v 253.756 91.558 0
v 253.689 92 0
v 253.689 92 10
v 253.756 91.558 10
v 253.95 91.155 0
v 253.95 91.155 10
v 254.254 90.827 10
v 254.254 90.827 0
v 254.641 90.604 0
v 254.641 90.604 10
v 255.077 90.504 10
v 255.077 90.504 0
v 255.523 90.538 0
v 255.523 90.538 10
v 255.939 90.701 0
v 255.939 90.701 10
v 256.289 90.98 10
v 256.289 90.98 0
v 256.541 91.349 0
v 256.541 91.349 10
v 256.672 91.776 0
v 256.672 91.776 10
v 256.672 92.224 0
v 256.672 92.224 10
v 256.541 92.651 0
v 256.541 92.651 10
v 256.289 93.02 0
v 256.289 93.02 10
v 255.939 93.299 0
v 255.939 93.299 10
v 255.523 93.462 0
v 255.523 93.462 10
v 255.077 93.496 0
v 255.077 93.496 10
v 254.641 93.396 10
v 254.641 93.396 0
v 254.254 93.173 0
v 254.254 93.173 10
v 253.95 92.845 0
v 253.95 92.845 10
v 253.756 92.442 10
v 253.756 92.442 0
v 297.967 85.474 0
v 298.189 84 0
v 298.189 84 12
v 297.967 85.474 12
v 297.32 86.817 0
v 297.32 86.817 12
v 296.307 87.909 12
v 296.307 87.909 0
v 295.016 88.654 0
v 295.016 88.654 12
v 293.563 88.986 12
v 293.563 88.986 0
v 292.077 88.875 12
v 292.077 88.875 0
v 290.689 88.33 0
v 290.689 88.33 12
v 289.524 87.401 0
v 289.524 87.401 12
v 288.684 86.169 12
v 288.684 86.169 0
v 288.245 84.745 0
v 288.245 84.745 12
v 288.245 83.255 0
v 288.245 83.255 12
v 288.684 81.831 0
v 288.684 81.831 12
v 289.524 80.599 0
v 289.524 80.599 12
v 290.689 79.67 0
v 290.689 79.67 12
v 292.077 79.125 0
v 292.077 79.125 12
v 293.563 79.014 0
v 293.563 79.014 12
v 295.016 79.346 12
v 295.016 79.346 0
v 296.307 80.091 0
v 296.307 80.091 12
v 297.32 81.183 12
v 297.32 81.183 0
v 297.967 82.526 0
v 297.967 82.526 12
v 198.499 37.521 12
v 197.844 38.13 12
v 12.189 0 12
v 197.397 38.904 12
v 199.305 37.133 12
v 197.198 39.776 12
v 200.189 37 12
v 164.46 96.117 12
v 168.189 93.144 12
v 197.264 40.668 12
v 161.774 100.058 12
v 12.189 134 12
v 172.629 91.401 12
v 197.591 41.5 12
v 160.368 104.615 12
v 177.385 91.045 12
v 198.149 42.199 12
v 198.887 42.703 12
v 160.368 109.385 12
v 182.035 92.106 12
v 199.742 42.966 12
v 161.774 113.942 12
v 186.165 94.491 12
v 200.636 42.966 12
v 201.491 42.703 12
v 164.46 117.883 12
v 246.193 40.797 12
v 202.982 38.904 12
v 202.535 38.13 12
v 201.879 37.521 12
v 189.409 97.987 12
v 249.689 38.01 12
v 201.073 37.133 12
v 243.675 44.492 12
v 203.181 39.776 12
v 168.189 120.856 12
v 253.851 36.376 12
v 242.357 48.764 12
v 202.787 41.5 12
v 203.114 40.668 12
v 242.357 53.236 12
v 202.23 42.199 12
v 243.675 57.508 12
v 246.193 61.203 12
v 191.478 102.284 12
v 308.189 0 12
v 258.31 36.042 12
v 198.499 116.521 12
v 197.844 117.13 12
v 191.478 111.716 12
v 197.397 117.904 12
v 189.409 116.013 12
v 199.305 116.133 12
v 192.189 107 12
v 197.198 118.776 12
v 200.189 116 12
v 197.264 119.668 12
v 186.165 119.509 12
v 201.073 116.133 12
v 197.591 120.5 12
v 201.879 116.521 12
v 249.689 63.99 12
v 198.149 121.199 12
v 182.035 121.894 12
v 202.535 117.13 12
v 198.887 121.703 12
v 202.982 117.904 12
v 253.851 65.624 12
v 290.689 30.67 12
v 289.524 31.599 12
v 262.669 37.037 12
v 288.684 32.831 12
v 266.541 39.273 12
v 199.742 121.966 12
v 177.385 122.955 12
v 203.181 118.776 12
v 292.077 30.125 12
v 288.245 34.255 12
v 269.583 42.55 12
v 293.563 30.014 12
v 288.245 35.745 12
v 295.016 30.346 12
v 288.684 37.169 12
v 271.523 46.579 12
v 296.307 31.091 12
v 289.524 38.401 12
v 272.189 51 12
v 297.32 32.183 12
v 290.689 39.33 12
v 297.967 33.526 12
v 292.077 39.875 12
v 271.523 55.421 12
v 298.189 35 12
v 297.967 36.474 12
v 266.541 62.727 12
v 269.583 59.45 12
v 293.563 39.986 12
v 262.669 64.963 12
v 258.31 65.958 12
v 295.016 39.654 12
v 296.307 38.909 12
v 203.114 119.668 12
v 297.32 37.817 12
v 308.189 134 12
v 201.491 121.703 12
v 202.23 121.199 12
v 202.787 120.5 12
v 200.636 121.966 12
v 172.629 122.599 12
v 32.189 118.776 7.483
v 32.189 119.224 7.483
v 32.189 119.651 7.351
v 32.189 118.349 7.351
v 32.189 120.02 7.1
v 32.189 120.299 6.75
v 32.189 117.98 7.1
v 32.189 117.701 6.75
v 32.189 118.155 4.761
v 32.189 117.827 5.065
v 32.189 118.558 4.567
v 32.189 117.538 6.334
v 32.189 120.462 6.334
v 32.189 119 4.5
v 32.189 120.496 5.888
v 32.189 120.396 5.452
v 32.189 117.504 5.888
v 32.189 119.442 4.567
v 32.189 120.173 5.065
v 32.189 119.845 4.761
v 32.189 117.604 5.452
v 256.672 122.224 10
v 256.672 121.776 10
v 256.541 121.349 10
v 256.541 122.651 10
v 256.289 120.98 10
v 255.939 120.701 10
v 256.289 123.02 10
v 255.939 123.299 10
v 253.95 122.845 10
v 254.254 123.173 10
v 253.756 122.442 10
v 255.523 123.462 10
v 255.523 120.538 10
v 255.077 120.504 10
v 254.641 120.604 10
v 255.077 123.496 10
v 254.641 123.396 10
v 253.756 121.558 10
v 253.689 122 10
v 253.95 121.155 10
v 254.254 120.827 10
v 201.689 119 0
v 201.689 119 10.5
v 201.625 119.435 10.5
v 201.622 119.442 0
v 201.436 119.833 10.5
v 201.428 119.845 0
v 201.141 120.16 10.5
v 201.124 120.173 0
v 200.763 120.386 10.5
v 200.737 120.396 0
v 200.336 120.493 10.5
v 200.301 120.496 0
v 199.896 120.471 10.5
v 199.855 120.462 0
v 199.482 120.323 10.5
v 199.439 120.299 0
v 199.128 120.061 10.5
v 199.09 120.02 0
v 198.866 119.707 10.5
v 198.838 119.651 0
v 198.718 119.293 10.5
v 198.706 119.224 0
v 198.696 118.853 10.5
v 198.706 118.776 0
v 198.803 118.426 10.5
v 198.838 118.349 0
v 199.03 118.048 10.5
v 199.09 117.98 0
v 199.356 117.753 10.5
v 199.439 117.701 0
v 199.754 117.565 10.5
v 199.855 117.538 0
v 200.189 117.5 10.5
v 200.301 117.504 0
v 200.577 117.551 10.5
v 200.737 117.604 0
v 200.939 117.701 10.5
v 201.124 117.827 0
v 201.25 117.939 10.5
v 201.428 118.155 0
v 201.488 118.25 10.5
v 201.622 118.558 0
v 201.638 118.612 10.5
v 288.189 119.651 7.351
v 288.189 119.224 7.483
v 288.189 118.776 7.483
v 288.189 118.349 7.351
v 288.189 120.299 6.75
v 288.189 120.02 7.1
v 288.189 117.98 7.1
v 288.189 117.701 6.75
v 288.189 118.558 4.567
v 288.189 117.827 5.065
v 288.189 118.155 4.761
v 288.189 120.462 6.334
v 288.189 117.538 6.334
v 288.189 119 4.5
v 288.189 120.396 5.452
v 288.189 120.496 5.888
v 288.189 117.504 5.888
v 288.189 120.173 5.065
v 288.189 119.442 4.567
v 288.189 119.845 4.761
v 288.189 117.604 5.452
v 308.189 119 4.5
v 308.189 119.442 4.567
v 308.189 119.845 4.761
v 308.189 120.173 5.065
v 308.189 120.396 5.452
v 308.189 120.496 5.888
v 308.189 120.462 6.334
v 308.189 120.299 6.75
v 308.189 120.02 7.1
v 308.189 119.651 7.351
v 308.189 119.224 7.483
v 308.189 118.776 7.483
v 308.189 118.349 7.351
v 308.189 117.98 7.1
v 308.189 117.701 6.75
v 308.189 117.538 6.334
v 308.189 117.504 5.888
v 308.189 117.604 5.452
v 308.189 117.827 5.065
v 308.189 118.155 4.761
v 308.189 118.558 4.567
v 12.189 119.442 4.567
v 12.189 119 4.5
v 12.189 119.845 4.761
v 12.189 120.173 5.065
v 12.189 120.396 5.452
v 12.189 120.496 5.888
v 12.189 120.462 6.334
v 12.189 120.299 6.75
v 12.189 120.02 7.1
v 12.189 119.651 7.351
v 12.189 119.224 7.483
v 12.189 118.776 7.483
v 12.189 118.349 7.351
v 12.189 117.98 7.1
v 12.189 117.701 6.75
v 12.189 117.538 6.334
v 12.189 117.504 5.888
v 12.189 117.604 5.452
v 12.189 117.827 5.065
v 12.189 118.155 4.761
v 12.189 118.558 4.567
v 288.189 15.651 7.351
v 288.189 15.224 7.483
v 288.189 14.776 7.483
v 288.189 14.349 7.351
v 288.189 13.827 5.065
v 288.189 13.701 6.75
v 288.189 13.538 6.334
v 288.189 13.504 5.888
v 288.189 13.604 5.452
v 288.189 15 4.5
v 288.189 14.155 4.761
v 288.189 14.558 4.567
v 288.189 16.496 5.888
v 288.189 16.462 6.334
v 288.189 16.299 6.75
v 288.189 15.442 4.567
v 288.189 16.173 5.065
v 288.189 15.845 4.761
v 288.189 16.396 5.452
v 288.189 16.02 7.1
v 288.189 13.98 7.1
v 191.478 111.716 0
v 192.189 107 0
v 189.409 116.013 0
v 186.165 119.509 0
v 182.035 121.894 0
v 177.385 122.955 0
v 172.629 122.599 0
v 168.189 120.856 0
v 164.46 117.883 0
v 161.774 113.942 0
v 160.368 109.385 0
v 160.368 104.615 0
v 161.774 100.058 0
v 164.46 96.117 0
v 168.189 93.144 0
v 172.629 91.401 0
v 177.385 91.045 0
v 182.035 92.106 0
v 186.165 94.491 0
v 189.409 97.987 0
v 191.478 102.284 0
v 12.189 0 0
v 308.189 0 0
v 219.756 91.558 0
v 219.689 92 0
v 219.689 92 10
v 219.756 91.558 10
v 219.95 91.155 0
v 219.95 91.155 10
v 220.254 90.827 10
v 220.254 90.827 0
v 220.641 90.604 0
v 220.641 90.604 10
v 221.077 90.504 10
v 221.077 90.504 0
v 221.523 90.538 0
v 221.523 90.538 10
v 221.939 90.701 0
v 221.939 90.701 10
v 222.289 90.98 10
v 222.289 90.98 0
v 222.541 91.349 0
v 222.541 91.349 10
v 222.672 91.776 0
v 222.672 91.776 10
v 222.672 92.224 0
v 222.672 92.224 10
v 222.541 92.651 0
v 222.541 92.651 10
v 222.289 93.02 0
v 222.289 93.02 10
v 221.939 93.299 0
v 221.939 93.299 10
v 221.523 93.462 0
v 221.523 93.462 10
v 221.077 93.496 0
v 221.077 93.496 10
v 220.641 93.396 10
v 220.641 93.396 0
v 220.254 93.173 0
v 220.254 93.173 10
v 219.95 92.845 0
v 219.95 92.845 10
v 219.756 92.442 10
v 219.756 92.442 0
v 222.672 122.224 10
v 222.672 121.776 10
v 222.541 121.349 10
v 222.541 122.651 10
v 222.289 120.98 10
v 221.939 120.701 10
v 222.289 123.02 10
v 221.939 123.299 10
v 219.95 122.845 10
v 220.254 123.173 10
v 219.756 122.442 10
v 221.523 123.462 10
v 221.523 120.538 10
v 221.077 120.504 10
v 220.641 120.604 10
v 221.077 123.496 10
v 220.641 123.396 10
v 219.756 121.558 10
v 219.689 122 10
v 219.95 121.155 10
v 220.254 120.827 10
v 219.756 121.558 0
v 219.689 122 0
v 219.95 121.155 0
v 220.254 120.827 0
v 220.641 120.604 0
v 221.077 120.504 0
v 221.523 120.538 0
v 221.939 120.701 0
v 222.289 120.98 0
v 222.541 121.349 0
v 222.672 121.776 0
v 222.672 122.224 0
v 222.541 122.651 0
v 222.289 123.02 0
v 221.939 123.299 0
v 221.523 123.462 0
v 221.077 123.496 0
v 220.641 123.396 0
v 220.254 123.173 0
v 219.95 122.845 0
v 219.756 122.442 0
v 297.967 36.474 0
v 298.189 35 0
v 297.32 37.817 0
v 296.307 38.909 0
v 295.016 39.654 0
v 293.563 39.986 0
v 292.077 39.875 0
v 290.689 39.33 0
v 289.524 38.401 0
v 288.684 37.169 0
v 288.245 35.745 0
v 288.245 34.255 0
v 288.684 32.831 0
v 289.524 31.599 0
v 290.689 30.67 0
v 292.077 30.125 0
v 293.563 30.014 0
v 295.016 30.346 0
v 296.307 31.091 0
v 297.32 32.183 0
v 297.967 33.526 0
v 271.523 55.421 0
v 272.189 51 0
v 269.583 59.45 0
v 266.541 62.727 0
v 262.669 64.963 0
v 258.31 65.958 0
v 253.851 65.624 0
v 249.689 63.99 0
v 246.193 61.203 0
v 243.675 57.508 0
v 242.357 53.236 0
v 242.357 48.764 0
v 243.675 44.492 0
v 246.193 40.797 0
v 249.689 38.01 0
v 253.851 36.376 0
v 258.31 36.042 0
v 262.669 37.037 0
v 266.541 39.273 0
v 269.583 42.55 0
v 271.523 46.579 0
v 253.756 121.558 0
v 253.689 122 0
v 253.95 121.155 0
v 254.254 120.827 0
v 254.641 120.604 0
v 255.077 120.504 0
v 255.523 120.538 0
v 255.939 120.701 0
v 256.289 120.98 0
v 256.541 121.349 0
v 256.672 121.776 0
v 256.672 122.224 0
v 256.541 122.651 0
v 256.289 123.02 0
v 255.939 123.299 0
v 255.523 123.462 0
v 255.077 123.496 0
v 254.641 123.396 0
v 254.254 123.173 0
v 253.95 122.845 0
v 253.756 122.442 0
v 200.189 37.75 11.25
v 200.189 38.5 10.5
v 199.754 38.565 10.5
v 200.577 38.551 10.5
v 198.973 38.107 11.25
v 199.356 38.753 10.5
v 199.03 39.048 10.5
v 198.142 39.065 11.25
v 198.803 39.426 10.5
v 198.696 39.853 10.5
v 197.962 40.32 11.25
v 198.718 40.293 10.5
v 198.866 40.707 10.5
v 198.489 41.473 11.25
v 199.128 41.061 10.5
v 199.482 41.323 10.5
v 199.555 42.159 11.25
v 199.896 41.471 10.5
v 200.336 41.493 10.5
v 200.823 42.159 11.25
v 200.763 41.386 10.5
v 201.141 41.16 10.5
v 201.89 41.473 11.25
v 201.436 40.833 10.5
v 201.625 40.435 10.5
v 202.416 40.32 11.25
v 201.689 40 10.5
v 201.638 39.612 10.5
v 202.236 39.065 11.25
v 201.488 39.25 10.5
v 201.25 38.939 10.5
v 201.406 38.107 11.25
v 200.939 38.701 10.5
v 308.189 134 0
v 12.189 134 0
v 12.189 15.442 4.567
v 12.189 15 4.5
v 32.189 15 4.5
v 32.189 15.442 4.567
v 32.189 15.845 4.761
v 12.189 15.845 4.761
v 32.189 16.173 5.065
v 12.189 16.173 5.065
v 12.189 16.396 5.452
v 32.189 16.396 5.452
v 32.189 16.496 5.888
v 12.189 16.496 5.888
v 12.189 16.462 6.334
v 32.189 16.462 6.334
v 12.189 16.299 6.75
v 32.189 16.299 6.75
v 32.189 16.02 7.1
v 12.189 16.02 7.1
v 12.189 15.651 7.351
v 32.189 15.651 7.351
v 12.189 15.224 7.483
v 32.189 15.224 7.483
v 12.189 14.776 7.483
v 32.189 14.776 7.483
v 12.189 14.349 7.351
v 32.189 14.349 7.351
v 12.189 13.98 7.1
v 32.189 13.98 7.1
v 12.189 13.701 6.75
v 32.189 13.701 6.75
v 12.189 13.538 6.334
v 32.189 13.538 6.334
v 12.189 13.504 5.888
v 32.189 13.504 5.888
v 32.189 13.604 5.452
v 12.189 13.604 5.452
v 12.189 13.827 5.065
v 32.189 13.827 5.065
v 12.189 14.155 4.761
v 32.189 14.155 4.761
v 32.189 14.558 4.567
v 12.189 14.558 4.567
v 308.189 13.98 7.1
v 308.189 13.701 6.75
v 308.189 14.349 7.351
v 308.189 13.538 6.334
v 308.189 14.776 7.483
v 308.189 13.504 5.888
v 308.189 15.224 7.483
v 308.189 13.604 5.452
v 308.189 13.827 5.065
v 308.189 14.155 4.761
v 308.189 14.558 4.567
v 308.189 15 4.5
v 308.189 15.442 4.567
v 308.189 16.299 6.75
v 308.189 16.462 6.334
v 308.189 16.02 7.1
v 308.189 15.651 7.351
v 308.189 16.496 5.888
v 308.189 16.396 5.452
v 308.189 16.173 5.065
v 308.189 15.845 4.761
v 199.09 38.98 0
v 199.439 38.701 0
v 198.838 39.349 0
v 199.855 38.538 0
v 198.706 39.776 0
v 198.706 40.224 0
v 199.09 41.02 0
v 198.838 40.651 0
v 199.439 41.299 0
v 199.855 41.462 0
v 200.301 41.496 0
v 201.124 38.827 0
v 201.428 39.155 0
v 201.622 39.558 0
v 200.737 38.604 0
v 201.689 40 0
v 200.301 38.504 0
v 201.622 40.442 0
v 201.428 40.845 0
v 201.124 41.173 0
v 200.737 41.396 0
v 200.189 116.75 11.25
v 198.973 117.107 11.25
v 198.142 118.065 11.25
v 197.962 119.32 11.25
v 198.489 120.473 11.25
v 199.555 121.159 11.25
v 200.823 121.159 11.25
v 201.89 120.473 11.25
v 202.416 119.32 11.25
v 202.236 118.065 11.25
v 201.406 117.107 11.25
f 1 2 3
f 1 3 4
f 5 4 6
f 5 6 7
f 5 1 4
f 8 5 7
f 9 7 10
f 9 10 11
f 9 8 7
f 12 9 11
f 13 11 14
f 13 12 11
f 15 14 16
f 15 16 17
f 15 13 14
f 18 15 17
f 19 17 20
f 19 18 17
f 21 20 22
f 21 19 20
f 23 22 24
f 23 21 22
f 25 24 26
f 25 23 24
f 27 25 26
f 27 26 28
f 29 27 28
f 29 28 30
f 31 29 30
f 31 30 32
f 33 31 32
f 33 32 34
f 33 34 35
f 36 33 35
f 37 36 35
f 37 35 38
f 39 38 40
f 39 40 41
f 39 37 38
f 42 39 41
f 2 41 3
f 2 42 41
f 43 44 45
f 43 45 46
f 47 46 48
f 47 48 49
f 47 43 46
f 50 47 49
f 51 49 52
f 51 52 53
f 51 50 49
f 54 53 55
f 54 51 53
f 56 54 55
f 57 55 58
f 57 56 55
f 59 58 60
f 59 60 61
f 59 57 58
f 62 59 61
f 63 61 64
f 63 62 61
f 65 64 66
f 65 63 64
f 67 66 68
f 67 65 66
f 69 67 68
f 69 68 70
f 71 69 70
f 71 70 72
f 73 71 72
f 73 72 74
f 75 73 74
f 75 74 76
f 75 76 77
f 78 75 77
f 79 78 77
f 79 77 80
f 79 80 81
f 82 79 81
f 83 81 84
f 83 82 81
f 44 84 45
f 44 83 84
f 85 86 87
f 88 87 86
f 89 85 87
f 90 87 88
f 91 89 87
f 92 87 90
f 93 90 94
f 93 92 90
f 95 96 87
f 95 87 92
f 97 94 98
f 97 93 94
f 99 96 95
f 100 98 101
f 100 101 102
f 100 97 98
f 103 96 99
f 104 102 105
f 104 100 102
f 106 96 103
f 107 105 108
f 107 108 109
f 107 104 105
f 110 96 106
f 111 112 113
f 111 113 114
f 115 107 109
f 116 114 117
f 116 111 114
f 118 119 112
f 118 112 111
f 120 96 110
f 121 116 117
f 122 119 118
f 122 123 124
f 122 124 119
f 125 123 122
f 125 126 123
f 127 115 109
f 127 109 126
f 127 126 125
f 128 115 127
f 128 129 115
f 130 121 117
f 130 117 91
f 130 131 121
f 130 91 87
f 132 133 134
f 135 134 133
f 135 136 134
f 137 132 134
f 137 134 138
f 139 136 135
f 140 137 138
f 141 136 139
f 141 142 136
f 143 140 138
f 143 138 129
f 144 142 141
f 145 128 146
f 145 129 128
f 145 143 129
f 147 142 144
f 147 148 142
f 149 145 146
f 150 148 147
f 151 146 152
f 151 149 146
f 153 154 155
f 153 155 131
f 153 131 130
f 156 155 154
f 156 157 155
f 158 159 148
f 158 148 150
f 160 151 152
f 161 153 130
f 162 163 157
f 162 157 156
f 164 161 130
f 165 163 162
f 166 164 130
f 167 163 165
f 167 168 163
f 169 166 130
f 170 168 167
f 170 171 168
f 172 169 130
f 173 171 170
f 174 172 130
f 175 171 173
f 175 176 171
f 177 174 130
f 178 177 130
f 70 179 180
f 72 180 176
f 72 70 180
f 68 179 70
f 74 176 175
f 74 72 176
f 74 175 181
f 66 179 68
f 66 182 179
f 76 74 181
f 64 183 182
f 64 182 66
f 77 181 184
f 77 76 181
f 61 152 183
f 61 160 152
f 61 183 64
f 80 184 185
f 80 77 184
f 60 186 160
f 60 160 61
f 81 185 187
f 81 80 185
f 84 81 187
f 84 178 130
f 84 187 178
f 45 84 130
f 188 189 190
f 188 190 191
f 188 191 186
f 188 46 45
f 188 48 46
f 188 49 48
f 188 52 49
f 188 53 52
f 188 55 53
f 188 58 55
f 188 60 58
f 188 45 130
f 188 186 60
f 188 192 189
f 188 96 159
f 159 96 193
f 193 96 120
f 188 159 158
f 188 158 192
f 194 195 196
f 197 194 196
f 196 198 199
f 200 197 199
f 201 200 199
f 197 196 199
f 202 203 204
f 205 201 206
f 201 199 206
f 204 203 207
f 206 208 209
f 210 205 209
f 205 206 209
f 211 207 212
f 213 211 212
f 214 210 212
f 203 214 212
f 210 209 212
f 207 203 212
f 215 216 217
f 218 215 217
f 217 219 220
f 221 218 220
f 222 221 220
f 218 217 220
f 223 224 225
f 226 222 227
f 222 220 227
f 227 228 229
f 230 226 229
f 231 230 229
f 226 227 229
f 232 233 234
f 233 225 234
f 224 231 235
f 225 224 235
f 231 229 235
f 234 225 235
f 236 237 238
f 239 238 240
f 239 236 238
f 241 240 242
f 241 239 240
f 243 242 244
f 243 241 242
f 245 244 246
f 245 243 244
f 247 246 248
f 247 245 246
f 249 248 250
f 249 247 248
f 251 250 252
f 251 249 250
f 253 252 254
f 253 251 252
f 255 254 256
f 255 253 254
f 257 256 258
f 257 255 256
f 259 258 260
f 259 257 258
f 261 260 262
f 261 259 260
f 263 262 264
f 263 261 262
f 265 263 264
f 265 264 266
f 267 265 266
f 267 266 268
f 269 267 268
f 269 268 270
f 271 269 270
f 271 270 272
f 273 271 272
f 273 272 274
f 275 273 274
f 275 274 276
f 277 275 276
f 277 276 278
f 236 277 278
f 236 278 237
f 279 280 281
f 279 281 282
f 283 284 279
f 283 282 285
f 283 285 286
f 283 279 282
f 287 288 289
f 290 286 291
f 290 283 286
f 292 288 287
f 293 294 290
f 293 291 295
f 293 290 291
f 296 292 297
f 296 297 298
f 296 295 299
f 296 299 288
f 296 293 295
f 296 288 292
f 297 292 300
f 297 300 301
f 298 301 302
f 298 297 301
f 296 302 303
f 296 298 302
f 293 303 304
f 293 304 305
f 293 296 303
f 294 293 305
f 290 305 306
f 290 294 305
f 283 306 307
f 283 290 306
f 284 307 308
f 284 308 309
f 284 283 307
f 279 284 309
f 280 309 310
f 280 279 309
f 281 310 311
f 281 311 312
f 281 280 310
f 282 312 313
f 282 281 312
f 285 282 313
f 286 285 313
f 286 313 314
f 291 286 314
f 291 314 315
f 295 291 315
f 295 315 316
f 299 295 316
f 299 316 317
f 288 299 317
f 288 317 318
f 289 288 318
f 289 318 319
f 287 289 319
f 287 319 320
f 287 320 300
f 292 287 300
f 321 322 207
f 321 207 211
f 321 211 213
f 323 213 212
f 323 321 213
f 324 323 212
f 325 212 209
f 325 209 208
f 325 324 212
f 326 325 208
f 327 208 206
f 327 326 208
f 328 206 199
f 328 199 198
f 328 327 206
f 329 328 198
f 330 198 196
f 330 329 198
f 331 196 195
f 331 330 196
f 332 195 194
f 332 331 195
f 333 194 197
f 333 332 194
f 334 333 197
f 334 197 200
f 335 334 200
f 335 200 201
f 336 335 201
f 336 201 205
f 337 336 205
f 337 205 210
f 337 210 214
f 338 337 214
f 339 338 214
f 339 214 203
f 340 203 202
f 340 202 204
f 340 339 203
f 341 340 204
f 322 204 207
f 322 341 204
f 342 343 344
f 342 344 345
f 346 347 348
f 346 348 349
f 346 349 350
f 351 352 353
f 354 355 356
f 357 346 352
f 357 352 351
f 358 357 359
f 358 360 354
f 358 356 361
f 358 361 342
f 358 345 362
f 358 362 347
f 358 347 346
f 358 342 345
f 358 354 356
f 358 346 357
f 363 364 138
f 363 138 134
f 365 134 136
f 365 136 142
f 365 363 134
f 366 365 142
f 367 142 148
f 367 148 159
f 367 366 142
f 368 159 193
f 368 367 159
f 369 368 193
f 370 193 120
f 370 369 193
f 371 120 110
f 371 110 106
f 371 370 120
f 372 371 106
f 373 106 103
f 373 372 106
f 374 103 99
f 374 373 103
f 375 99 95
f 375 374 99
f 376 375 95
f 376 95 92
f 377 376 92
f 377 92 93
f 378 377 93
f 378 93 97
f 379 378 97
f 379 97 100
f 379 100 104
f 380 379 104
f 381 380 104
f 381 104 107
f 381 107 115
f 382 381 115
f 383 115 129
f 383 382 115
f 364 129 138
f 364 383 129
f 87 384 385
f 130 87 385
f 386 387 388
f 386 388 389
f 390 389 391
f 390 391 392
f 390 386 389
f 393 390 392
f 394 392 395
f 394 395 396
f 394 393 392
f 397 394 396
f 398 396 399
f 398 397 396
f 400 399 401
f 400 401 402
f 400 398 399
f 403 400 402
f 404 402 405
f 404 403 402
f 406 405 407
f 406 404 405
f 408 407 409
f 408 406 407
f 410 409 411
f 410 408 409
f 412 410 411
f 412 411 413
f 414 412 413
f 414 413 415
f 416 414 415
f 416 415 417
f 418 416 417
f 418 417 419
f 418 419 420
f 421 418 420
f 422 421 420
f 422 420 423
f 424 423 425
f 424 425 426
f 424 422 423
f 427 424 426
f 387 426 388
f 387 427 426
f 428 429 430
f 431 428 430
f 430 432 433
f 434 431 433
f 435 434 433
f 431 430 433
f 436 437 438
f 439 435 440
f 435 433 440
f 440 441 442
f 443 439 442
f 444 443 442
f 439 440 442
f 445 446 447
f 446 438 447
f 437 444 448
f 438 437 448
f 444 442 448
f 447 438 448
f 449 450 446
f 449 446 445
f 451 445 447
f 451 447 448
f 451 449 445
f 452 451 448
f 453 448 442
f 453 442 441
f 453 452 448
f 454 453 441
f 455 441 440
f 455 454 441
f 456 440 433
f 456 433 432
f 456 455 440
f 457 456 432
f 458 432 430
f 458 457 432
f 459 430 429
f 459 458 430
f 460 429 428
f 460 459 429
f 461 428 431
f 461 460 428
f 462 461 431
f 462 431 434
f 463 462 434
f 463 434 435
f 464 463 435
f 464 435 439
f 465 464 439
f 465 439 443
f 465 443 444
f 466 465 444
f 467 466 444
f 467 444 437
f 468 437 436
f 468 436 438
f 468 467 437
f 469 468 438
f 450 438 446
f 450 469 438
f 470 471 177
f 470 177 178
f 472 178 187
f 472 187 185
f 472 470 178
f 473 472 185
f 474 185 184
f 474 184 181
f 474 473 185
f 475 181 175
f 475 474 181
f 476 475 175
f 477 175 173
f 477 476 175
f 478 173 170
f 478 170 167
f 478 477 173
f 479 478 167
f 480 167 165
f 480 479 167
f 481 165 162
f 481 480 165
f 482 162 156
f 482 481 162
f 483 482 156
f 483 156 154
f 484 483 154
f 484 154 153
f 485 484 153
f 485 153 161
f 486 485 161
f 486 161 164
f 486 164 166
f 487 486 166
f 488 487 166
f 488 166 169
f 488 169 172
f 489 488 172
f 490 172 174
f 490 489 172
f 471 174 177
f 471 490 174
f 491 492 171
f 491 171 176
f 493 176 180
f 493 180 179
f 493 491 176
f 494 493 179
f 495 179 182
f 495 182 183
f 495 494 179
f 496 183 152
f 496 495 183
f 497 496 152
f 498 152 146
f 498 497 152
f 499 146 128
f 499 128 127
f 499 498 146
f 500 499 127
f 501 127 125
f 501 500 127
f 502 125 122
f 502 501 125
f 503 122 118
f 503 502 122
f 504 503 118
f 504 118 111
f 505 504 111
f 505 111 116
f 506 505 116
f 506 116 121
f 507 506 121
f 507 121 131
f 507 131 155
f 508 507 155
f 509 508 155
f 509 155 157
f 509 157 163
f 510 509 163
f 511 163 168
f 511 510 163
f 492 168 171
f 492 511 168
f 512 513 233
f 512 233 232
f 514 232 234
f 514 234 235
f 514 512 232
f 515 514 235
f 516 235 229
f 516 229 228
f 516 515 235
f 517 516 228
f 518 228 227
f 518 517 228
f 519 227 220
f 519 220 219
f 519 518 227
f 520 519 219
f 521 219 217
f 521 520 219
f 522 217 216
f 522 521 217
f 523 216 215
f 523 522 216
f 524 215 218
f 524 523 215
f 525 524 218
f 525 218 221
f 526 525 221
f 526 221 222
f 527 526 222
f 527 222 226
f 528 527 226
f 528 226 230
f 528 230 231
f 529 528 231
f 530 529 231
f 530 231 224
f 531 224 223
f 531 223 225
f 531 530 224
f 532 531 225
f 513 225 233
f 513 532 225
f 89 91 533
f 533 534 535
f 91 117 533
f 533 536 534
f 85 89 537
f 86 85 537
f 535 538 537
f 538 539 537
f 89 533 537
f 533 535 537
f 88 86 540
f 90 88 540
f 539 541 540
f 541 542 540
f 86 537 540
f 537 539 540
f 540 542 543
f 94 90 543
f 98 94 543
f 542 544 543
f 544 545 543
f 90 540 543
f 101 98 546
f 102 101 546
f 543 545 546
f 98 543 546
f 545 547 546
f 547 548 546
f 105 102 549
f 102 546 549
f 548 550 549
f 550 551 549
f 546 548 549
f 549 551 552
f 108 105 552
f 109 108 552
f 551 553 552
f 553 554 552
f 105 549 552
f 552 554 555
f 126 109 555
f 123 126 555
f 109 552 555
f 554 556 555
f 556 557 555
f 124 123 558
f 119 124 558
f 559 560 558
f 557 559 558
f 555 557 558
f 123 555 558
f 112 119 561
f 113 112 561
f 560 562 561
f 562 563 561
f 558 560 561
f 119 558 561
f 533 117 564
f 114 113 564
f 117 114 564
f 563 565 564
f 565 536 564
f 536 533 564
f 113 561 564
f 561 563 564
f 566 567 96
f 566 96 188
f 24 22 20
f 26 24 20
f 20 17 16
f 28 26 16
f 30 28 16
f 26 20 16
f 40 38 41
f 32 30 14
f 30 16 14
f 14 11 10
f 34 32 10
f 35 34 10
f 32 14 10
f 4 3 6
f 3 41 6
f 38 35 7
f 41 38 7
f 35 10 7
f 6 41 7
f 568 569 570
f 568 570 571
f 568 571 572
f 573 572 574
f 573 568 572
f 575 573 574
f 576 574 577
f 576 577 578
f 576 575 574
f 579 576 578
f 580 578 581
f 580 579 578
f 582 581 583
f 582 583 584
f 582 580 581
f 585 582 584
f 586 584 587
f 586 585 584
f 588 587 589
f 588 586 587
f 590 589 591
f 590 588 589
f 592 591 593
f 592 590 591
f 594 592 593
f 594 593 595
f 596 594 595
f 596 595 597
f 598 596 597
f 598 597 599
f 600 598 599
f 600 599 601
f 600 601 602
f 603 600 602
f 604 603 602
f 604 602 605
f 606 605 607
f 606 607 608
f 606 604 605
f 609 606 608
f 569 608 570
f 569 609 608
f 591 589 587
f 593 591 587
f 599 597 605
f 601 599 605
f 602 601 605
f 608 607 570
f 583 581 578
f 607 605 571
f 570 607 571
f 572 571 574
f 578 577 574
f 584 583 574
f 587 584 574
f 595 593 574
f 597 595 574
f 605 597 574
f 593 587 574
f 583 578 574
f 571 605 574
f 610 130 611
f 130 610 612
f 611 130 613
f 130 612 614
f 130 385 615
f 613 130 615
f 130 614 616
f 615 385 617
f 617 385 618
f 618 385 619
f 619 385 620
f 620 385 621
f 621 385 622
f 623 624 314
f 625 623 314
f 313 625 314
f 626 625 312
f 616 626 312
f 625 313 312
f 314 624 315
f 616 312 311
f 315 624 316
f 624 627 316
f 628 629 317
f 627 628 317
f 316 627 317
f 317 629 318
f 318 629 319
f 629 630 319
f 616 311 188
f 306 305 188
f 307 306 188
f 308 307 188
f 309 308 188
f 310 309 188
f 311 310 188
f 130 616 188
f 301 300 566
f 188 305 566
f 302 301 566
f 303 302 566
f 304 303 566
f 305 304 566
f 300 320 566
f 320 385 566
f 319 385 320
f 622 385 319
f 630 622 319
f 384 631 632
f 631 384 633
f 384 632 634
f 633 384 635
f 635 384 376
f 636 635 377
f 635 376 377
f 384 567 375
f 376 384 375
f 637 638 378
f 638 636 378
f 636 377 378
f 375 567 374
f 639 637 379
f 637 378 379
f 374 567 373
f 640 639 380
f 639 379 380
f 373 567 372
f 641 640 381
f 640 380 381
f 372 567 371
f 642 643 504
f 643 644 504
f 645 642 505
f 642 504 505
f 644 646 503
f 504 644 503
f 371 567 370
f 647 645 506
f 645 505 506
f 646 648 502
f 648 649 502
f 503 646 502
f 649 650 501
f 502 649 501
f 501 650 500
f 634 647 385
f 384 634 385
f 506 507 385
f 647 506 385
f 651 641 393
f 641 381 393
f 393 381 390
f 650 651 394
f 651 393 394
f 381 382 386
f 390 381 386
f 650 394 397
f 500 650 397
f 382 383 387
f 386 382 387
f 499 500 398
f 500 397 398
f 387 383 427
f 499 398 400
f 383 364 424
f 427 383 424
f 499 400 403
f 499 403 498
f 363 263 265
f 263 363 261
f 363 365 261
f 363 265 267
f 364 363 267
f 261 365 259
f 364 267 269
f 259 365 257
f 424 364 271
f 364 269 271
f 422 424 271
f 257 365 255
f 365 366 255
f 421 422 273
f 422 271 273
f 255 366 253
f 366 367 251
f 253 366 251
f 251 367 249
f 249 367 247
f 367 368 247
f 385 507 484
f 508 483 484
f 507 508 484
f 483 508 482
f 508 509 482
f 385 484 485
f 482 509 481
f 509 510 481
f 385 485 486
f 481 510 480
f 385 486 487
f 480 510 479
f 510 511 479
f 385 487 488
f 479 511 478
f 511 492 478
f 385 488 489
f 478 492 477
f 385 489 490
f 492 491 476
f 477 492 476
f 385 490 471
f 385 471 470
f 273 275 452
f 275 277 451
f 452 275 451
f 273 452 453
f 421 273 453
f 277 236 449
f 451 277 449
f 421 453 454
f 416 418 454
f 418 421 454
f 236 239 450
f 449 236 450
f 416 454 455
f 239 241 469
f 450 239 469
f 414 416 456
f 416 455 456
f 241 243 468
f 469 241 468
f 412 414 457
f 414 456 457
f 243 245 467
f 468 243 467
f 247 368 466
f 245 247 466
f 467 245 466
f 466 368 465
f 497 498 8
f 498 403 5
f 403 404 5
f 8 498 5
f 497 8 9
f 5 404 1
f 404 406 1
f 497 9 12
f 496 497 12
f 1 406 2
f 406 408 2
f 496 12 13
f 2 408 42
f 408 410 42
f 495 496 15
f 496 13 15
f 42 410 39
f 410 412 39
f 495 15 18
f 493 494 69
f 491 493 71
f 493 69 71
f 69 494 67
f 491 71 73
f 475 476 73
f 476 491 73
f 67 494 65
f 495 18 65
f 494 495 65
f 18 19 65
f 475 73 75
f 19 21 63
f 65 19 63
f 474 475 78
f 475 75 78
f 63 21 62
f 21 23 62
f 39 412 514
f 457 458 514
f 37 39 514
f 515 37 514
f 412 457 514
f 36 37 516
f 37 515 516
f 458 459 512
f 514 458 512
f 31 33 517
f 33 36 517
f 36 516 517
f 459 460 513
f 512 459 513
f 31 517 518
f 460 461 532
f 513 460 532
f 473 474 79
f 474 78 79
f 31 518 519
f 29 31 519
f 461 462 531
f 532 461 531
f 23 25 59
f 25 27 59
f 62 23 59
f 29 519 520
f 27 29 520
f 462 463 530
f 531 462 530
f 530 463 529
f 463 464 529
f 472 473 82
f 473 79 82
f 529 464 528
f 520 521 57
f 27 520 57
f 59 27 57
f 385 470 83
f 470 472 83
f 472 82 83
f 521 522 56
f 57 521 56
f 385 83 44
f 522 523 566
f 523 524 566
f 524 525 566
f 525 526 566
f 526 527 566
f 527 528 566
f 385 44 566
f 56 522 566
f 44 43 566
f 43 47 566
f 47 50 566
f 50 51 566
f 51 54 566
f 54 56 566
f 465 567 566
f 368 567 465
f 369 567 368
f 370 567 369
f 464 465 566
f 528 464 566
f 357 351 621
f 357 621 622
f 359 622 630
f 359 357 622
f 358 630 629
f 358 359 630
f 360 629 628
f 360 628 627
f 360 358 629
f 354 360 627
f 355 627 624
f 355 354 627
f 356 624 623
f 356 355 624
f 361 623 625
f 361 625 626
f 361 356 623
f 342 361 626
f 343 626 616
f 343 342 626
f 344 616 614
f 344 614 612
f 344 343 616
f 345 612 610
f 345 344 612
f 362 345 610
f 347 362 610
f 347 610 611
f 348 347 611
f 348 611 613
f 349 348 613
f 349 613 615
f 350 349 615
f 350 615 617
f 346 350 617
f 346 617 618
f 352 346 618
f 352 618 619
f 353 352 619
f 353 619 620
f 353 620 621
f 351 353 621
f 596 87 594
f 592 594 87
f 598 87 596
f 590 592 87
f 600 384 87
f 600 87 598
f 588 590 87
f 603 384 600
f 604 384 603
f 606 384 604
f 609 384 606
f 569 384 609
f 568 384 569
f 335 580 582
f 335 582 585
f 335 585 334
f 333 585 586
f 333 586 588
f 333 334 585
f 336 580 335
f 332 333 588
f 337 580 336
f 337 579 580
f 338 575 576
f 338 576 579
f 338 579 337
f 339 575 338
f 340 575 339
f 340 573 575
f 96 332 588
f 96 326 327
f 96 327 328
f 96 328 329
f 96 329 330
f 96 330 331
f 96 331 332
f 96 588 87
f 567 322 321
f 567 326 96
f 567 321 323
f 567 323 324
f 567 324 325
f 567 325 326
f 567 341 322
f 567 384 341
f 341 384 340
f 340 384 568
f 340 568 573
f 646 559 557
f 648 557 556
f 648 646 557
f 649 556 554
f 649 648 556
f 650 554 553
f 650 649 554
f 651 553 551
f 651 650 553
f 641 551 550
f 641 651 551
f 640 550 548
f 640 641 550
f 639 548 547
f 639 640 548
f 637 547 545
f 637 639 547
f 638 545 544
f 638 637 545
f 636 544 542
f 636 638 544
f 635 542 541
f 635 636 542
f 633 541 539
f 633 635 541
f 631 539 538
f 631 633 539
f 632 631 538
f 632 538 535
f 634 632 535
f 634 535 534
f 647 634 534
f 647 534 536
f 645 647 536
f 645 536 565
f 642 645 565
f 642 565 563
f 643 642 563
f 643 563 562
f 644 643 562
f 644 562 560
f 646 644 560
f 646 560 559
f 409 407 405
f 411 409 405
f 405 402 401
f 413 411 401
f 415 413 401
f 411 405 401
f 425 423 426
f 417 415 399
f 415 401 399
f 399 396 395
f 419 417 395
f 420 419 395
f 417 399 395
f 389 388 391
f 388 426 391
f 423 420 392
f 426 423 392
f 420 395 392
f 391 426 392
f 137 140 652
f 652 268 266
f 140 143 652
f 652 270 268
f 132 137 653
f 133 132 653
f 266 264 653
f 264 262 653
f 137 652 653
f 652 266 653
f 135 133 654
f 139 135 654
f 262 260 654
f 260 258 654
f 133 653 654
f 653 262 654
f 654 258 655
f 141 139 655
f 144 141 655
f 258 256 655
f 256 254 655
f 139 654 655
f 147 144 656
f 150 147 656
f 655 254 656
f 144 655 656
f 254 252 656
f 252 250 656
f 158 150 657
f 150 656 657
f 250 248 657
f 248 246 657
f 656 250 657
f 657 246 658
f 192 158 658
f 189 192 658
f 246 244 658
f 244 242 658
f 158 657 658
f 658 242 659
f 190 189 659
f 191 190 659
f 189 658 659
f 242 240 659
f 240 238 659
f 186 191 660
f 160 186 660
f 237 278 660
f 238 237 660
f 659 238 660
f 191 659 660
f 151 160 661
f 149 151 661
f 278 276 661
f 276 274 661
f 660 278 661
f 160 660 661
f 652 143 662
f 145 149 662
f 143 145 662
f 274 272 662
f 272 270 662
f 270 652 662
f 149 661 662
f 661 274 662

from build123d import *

# Parameters (mm, degrees)
SKETCH1_W           = 296
SKETCH1_H           = 134
SKETCH1_R           = 15
SKETCH1_R_2         = 16
SKETCH1_R_3         = 5
SKETCH1_R_4         = 1.5
BOSS_EXTRUDE1_DEPTH = 12
CUT_EXTRUDE1_START  = 12.189127
SKETCH2_R           = 1.5
CUT_EXTRUDE1_DEPTH  = 20
CUT_EXTRUDE2_START  = 288.189127
SKETCH2_2_R         = 1.5
CUT_EXTRUDE2_DEPTH  = 20.000001
SKETCH5_R           = 1.5
CUT_EXTRUDE5_DEPTH  = 10


with BuildPart() as part:
    # Sketch1 → Boss-Extrude1 (new body)
    with BuildSketch(Plane.XY):
        with Locations((160.18912744, 67)):
            Rectangle(SKETCH1_W, SKETCH1_H)
        with Locations((257.18912744, 51)):
            Circle(SKETCH1_R, mode=Mode.SUBTRACT)
        with Locations((176.18912744, 107)):
            Circle(SKETCH1_R_2, mode=Mode.SUBTRACT)
        with Locations((293.18912744, 84)):
            Circle(SKETCH1_R_3, mode=Mode.SUBTRACT)
        with Locations((200.18912744, 119)):
            Circle(SKETCH1_R_4, mode=Mode.SUBTRACT)
        with Locations((200.18912744, 40)):
            Circle(SKETCH1_R_4, mode=Mode.SUBTRACT)
        with Locations((293.18912744, 35)):
            Circle(SKETCH1_R_3, mode=Mode.SUBTRACT)
    extrude(amount=BOSS_EXTRUDE1_DEPTH)

    # Sketch2 → Cut-Extrude1 (cut)
    with BuildSketch(Plane(origin=(0, 0, 0), x_dir=(0, 0, -1), z_dir=(1, 0, 0)).offset(CUT_EXTRUDE1_START)):
        with Locations((-6, 119)):
            Circle(SKETCH2_R)
        with Locations((-6, 15)):
            Circle(SKETCH2_R)
    extrude(amount=CUT_EXTRUDE1_DEPTH, mode=Mode.SUBTRACT)

    # Sketch2<2> → Cut-Extrude2 (cut)
    with BuildSketch(Plane(origin=(0, 0, 0), x_dir=(0, 0, -1), z_dir=(1, 0, 0)).offset(CUT_EXTRUDE2_START)):
        with Locations((-6, 119)):
            Circle(SKETCH2_2_R)
        with Locations((-6, 15)):
            Circle(SKETCH2_2_R)
    extrude(amount=CUT_EXTRUDE2_DEPTH, mode=Mode.SUBTRACT)

    # Cut-Extrude4 cone 1 section (through the dimple's axis) → Cut-Extrude4 (revolve, cut)
    with BuildSketch(Plane(origin=(200.18912744, 119, 12), x_dir=(0, -1, 0), z_dir=(1, 0, 0))):
        Polygon((0, 0), (3, 0), (0, 3), align=None)
    revolve(axis=Axis((200.18912744, 119, 12), (0, 0, -1)), mode=Mode.SUBTRACT)

    # Cut-Extrude4 cone 2 section (through the dimple's axis) → Cut-Extrude4 cone 2 (revolve, cut)
    with BuildSketch(Plane(origin=(200.18912744, 40, 12), x_dir=(0, -1, 0), z_dir=(1, 0, 0))):
        Polygon((0, 0), (3, 0), (0, 3), align=None)
    revolve(axis=Axis((200.18912744, 40, 12), (0, 0, -1)), mode=Mode.SUBTRACT)

    # Sketch5 → Cut-Extrude5 (cut)
    with BuildSketch(Plane.XY):
        with Locations(Location((221.18912744, 122, 0), (0, 0, 180))):
            Circle(SKETCH5_R)
        with Locations(Location((255.18912744, 122, 0), (0, 0, 180))):
            Circle(SKETCH5_R)
        with Locations(Location((221.18912744, 92, 0), (0, 0, 180))):
            Circle(SKETCH5_R)
        with Locations(Location((255.18912744, 92, 0), (0, 0, 180))):
            Circle(SKETCH5_R)
    extrude(amount=CUT_EXTRUDE5_DEPTH, mode=Mode.SUBTRACT)


solid = part.part
